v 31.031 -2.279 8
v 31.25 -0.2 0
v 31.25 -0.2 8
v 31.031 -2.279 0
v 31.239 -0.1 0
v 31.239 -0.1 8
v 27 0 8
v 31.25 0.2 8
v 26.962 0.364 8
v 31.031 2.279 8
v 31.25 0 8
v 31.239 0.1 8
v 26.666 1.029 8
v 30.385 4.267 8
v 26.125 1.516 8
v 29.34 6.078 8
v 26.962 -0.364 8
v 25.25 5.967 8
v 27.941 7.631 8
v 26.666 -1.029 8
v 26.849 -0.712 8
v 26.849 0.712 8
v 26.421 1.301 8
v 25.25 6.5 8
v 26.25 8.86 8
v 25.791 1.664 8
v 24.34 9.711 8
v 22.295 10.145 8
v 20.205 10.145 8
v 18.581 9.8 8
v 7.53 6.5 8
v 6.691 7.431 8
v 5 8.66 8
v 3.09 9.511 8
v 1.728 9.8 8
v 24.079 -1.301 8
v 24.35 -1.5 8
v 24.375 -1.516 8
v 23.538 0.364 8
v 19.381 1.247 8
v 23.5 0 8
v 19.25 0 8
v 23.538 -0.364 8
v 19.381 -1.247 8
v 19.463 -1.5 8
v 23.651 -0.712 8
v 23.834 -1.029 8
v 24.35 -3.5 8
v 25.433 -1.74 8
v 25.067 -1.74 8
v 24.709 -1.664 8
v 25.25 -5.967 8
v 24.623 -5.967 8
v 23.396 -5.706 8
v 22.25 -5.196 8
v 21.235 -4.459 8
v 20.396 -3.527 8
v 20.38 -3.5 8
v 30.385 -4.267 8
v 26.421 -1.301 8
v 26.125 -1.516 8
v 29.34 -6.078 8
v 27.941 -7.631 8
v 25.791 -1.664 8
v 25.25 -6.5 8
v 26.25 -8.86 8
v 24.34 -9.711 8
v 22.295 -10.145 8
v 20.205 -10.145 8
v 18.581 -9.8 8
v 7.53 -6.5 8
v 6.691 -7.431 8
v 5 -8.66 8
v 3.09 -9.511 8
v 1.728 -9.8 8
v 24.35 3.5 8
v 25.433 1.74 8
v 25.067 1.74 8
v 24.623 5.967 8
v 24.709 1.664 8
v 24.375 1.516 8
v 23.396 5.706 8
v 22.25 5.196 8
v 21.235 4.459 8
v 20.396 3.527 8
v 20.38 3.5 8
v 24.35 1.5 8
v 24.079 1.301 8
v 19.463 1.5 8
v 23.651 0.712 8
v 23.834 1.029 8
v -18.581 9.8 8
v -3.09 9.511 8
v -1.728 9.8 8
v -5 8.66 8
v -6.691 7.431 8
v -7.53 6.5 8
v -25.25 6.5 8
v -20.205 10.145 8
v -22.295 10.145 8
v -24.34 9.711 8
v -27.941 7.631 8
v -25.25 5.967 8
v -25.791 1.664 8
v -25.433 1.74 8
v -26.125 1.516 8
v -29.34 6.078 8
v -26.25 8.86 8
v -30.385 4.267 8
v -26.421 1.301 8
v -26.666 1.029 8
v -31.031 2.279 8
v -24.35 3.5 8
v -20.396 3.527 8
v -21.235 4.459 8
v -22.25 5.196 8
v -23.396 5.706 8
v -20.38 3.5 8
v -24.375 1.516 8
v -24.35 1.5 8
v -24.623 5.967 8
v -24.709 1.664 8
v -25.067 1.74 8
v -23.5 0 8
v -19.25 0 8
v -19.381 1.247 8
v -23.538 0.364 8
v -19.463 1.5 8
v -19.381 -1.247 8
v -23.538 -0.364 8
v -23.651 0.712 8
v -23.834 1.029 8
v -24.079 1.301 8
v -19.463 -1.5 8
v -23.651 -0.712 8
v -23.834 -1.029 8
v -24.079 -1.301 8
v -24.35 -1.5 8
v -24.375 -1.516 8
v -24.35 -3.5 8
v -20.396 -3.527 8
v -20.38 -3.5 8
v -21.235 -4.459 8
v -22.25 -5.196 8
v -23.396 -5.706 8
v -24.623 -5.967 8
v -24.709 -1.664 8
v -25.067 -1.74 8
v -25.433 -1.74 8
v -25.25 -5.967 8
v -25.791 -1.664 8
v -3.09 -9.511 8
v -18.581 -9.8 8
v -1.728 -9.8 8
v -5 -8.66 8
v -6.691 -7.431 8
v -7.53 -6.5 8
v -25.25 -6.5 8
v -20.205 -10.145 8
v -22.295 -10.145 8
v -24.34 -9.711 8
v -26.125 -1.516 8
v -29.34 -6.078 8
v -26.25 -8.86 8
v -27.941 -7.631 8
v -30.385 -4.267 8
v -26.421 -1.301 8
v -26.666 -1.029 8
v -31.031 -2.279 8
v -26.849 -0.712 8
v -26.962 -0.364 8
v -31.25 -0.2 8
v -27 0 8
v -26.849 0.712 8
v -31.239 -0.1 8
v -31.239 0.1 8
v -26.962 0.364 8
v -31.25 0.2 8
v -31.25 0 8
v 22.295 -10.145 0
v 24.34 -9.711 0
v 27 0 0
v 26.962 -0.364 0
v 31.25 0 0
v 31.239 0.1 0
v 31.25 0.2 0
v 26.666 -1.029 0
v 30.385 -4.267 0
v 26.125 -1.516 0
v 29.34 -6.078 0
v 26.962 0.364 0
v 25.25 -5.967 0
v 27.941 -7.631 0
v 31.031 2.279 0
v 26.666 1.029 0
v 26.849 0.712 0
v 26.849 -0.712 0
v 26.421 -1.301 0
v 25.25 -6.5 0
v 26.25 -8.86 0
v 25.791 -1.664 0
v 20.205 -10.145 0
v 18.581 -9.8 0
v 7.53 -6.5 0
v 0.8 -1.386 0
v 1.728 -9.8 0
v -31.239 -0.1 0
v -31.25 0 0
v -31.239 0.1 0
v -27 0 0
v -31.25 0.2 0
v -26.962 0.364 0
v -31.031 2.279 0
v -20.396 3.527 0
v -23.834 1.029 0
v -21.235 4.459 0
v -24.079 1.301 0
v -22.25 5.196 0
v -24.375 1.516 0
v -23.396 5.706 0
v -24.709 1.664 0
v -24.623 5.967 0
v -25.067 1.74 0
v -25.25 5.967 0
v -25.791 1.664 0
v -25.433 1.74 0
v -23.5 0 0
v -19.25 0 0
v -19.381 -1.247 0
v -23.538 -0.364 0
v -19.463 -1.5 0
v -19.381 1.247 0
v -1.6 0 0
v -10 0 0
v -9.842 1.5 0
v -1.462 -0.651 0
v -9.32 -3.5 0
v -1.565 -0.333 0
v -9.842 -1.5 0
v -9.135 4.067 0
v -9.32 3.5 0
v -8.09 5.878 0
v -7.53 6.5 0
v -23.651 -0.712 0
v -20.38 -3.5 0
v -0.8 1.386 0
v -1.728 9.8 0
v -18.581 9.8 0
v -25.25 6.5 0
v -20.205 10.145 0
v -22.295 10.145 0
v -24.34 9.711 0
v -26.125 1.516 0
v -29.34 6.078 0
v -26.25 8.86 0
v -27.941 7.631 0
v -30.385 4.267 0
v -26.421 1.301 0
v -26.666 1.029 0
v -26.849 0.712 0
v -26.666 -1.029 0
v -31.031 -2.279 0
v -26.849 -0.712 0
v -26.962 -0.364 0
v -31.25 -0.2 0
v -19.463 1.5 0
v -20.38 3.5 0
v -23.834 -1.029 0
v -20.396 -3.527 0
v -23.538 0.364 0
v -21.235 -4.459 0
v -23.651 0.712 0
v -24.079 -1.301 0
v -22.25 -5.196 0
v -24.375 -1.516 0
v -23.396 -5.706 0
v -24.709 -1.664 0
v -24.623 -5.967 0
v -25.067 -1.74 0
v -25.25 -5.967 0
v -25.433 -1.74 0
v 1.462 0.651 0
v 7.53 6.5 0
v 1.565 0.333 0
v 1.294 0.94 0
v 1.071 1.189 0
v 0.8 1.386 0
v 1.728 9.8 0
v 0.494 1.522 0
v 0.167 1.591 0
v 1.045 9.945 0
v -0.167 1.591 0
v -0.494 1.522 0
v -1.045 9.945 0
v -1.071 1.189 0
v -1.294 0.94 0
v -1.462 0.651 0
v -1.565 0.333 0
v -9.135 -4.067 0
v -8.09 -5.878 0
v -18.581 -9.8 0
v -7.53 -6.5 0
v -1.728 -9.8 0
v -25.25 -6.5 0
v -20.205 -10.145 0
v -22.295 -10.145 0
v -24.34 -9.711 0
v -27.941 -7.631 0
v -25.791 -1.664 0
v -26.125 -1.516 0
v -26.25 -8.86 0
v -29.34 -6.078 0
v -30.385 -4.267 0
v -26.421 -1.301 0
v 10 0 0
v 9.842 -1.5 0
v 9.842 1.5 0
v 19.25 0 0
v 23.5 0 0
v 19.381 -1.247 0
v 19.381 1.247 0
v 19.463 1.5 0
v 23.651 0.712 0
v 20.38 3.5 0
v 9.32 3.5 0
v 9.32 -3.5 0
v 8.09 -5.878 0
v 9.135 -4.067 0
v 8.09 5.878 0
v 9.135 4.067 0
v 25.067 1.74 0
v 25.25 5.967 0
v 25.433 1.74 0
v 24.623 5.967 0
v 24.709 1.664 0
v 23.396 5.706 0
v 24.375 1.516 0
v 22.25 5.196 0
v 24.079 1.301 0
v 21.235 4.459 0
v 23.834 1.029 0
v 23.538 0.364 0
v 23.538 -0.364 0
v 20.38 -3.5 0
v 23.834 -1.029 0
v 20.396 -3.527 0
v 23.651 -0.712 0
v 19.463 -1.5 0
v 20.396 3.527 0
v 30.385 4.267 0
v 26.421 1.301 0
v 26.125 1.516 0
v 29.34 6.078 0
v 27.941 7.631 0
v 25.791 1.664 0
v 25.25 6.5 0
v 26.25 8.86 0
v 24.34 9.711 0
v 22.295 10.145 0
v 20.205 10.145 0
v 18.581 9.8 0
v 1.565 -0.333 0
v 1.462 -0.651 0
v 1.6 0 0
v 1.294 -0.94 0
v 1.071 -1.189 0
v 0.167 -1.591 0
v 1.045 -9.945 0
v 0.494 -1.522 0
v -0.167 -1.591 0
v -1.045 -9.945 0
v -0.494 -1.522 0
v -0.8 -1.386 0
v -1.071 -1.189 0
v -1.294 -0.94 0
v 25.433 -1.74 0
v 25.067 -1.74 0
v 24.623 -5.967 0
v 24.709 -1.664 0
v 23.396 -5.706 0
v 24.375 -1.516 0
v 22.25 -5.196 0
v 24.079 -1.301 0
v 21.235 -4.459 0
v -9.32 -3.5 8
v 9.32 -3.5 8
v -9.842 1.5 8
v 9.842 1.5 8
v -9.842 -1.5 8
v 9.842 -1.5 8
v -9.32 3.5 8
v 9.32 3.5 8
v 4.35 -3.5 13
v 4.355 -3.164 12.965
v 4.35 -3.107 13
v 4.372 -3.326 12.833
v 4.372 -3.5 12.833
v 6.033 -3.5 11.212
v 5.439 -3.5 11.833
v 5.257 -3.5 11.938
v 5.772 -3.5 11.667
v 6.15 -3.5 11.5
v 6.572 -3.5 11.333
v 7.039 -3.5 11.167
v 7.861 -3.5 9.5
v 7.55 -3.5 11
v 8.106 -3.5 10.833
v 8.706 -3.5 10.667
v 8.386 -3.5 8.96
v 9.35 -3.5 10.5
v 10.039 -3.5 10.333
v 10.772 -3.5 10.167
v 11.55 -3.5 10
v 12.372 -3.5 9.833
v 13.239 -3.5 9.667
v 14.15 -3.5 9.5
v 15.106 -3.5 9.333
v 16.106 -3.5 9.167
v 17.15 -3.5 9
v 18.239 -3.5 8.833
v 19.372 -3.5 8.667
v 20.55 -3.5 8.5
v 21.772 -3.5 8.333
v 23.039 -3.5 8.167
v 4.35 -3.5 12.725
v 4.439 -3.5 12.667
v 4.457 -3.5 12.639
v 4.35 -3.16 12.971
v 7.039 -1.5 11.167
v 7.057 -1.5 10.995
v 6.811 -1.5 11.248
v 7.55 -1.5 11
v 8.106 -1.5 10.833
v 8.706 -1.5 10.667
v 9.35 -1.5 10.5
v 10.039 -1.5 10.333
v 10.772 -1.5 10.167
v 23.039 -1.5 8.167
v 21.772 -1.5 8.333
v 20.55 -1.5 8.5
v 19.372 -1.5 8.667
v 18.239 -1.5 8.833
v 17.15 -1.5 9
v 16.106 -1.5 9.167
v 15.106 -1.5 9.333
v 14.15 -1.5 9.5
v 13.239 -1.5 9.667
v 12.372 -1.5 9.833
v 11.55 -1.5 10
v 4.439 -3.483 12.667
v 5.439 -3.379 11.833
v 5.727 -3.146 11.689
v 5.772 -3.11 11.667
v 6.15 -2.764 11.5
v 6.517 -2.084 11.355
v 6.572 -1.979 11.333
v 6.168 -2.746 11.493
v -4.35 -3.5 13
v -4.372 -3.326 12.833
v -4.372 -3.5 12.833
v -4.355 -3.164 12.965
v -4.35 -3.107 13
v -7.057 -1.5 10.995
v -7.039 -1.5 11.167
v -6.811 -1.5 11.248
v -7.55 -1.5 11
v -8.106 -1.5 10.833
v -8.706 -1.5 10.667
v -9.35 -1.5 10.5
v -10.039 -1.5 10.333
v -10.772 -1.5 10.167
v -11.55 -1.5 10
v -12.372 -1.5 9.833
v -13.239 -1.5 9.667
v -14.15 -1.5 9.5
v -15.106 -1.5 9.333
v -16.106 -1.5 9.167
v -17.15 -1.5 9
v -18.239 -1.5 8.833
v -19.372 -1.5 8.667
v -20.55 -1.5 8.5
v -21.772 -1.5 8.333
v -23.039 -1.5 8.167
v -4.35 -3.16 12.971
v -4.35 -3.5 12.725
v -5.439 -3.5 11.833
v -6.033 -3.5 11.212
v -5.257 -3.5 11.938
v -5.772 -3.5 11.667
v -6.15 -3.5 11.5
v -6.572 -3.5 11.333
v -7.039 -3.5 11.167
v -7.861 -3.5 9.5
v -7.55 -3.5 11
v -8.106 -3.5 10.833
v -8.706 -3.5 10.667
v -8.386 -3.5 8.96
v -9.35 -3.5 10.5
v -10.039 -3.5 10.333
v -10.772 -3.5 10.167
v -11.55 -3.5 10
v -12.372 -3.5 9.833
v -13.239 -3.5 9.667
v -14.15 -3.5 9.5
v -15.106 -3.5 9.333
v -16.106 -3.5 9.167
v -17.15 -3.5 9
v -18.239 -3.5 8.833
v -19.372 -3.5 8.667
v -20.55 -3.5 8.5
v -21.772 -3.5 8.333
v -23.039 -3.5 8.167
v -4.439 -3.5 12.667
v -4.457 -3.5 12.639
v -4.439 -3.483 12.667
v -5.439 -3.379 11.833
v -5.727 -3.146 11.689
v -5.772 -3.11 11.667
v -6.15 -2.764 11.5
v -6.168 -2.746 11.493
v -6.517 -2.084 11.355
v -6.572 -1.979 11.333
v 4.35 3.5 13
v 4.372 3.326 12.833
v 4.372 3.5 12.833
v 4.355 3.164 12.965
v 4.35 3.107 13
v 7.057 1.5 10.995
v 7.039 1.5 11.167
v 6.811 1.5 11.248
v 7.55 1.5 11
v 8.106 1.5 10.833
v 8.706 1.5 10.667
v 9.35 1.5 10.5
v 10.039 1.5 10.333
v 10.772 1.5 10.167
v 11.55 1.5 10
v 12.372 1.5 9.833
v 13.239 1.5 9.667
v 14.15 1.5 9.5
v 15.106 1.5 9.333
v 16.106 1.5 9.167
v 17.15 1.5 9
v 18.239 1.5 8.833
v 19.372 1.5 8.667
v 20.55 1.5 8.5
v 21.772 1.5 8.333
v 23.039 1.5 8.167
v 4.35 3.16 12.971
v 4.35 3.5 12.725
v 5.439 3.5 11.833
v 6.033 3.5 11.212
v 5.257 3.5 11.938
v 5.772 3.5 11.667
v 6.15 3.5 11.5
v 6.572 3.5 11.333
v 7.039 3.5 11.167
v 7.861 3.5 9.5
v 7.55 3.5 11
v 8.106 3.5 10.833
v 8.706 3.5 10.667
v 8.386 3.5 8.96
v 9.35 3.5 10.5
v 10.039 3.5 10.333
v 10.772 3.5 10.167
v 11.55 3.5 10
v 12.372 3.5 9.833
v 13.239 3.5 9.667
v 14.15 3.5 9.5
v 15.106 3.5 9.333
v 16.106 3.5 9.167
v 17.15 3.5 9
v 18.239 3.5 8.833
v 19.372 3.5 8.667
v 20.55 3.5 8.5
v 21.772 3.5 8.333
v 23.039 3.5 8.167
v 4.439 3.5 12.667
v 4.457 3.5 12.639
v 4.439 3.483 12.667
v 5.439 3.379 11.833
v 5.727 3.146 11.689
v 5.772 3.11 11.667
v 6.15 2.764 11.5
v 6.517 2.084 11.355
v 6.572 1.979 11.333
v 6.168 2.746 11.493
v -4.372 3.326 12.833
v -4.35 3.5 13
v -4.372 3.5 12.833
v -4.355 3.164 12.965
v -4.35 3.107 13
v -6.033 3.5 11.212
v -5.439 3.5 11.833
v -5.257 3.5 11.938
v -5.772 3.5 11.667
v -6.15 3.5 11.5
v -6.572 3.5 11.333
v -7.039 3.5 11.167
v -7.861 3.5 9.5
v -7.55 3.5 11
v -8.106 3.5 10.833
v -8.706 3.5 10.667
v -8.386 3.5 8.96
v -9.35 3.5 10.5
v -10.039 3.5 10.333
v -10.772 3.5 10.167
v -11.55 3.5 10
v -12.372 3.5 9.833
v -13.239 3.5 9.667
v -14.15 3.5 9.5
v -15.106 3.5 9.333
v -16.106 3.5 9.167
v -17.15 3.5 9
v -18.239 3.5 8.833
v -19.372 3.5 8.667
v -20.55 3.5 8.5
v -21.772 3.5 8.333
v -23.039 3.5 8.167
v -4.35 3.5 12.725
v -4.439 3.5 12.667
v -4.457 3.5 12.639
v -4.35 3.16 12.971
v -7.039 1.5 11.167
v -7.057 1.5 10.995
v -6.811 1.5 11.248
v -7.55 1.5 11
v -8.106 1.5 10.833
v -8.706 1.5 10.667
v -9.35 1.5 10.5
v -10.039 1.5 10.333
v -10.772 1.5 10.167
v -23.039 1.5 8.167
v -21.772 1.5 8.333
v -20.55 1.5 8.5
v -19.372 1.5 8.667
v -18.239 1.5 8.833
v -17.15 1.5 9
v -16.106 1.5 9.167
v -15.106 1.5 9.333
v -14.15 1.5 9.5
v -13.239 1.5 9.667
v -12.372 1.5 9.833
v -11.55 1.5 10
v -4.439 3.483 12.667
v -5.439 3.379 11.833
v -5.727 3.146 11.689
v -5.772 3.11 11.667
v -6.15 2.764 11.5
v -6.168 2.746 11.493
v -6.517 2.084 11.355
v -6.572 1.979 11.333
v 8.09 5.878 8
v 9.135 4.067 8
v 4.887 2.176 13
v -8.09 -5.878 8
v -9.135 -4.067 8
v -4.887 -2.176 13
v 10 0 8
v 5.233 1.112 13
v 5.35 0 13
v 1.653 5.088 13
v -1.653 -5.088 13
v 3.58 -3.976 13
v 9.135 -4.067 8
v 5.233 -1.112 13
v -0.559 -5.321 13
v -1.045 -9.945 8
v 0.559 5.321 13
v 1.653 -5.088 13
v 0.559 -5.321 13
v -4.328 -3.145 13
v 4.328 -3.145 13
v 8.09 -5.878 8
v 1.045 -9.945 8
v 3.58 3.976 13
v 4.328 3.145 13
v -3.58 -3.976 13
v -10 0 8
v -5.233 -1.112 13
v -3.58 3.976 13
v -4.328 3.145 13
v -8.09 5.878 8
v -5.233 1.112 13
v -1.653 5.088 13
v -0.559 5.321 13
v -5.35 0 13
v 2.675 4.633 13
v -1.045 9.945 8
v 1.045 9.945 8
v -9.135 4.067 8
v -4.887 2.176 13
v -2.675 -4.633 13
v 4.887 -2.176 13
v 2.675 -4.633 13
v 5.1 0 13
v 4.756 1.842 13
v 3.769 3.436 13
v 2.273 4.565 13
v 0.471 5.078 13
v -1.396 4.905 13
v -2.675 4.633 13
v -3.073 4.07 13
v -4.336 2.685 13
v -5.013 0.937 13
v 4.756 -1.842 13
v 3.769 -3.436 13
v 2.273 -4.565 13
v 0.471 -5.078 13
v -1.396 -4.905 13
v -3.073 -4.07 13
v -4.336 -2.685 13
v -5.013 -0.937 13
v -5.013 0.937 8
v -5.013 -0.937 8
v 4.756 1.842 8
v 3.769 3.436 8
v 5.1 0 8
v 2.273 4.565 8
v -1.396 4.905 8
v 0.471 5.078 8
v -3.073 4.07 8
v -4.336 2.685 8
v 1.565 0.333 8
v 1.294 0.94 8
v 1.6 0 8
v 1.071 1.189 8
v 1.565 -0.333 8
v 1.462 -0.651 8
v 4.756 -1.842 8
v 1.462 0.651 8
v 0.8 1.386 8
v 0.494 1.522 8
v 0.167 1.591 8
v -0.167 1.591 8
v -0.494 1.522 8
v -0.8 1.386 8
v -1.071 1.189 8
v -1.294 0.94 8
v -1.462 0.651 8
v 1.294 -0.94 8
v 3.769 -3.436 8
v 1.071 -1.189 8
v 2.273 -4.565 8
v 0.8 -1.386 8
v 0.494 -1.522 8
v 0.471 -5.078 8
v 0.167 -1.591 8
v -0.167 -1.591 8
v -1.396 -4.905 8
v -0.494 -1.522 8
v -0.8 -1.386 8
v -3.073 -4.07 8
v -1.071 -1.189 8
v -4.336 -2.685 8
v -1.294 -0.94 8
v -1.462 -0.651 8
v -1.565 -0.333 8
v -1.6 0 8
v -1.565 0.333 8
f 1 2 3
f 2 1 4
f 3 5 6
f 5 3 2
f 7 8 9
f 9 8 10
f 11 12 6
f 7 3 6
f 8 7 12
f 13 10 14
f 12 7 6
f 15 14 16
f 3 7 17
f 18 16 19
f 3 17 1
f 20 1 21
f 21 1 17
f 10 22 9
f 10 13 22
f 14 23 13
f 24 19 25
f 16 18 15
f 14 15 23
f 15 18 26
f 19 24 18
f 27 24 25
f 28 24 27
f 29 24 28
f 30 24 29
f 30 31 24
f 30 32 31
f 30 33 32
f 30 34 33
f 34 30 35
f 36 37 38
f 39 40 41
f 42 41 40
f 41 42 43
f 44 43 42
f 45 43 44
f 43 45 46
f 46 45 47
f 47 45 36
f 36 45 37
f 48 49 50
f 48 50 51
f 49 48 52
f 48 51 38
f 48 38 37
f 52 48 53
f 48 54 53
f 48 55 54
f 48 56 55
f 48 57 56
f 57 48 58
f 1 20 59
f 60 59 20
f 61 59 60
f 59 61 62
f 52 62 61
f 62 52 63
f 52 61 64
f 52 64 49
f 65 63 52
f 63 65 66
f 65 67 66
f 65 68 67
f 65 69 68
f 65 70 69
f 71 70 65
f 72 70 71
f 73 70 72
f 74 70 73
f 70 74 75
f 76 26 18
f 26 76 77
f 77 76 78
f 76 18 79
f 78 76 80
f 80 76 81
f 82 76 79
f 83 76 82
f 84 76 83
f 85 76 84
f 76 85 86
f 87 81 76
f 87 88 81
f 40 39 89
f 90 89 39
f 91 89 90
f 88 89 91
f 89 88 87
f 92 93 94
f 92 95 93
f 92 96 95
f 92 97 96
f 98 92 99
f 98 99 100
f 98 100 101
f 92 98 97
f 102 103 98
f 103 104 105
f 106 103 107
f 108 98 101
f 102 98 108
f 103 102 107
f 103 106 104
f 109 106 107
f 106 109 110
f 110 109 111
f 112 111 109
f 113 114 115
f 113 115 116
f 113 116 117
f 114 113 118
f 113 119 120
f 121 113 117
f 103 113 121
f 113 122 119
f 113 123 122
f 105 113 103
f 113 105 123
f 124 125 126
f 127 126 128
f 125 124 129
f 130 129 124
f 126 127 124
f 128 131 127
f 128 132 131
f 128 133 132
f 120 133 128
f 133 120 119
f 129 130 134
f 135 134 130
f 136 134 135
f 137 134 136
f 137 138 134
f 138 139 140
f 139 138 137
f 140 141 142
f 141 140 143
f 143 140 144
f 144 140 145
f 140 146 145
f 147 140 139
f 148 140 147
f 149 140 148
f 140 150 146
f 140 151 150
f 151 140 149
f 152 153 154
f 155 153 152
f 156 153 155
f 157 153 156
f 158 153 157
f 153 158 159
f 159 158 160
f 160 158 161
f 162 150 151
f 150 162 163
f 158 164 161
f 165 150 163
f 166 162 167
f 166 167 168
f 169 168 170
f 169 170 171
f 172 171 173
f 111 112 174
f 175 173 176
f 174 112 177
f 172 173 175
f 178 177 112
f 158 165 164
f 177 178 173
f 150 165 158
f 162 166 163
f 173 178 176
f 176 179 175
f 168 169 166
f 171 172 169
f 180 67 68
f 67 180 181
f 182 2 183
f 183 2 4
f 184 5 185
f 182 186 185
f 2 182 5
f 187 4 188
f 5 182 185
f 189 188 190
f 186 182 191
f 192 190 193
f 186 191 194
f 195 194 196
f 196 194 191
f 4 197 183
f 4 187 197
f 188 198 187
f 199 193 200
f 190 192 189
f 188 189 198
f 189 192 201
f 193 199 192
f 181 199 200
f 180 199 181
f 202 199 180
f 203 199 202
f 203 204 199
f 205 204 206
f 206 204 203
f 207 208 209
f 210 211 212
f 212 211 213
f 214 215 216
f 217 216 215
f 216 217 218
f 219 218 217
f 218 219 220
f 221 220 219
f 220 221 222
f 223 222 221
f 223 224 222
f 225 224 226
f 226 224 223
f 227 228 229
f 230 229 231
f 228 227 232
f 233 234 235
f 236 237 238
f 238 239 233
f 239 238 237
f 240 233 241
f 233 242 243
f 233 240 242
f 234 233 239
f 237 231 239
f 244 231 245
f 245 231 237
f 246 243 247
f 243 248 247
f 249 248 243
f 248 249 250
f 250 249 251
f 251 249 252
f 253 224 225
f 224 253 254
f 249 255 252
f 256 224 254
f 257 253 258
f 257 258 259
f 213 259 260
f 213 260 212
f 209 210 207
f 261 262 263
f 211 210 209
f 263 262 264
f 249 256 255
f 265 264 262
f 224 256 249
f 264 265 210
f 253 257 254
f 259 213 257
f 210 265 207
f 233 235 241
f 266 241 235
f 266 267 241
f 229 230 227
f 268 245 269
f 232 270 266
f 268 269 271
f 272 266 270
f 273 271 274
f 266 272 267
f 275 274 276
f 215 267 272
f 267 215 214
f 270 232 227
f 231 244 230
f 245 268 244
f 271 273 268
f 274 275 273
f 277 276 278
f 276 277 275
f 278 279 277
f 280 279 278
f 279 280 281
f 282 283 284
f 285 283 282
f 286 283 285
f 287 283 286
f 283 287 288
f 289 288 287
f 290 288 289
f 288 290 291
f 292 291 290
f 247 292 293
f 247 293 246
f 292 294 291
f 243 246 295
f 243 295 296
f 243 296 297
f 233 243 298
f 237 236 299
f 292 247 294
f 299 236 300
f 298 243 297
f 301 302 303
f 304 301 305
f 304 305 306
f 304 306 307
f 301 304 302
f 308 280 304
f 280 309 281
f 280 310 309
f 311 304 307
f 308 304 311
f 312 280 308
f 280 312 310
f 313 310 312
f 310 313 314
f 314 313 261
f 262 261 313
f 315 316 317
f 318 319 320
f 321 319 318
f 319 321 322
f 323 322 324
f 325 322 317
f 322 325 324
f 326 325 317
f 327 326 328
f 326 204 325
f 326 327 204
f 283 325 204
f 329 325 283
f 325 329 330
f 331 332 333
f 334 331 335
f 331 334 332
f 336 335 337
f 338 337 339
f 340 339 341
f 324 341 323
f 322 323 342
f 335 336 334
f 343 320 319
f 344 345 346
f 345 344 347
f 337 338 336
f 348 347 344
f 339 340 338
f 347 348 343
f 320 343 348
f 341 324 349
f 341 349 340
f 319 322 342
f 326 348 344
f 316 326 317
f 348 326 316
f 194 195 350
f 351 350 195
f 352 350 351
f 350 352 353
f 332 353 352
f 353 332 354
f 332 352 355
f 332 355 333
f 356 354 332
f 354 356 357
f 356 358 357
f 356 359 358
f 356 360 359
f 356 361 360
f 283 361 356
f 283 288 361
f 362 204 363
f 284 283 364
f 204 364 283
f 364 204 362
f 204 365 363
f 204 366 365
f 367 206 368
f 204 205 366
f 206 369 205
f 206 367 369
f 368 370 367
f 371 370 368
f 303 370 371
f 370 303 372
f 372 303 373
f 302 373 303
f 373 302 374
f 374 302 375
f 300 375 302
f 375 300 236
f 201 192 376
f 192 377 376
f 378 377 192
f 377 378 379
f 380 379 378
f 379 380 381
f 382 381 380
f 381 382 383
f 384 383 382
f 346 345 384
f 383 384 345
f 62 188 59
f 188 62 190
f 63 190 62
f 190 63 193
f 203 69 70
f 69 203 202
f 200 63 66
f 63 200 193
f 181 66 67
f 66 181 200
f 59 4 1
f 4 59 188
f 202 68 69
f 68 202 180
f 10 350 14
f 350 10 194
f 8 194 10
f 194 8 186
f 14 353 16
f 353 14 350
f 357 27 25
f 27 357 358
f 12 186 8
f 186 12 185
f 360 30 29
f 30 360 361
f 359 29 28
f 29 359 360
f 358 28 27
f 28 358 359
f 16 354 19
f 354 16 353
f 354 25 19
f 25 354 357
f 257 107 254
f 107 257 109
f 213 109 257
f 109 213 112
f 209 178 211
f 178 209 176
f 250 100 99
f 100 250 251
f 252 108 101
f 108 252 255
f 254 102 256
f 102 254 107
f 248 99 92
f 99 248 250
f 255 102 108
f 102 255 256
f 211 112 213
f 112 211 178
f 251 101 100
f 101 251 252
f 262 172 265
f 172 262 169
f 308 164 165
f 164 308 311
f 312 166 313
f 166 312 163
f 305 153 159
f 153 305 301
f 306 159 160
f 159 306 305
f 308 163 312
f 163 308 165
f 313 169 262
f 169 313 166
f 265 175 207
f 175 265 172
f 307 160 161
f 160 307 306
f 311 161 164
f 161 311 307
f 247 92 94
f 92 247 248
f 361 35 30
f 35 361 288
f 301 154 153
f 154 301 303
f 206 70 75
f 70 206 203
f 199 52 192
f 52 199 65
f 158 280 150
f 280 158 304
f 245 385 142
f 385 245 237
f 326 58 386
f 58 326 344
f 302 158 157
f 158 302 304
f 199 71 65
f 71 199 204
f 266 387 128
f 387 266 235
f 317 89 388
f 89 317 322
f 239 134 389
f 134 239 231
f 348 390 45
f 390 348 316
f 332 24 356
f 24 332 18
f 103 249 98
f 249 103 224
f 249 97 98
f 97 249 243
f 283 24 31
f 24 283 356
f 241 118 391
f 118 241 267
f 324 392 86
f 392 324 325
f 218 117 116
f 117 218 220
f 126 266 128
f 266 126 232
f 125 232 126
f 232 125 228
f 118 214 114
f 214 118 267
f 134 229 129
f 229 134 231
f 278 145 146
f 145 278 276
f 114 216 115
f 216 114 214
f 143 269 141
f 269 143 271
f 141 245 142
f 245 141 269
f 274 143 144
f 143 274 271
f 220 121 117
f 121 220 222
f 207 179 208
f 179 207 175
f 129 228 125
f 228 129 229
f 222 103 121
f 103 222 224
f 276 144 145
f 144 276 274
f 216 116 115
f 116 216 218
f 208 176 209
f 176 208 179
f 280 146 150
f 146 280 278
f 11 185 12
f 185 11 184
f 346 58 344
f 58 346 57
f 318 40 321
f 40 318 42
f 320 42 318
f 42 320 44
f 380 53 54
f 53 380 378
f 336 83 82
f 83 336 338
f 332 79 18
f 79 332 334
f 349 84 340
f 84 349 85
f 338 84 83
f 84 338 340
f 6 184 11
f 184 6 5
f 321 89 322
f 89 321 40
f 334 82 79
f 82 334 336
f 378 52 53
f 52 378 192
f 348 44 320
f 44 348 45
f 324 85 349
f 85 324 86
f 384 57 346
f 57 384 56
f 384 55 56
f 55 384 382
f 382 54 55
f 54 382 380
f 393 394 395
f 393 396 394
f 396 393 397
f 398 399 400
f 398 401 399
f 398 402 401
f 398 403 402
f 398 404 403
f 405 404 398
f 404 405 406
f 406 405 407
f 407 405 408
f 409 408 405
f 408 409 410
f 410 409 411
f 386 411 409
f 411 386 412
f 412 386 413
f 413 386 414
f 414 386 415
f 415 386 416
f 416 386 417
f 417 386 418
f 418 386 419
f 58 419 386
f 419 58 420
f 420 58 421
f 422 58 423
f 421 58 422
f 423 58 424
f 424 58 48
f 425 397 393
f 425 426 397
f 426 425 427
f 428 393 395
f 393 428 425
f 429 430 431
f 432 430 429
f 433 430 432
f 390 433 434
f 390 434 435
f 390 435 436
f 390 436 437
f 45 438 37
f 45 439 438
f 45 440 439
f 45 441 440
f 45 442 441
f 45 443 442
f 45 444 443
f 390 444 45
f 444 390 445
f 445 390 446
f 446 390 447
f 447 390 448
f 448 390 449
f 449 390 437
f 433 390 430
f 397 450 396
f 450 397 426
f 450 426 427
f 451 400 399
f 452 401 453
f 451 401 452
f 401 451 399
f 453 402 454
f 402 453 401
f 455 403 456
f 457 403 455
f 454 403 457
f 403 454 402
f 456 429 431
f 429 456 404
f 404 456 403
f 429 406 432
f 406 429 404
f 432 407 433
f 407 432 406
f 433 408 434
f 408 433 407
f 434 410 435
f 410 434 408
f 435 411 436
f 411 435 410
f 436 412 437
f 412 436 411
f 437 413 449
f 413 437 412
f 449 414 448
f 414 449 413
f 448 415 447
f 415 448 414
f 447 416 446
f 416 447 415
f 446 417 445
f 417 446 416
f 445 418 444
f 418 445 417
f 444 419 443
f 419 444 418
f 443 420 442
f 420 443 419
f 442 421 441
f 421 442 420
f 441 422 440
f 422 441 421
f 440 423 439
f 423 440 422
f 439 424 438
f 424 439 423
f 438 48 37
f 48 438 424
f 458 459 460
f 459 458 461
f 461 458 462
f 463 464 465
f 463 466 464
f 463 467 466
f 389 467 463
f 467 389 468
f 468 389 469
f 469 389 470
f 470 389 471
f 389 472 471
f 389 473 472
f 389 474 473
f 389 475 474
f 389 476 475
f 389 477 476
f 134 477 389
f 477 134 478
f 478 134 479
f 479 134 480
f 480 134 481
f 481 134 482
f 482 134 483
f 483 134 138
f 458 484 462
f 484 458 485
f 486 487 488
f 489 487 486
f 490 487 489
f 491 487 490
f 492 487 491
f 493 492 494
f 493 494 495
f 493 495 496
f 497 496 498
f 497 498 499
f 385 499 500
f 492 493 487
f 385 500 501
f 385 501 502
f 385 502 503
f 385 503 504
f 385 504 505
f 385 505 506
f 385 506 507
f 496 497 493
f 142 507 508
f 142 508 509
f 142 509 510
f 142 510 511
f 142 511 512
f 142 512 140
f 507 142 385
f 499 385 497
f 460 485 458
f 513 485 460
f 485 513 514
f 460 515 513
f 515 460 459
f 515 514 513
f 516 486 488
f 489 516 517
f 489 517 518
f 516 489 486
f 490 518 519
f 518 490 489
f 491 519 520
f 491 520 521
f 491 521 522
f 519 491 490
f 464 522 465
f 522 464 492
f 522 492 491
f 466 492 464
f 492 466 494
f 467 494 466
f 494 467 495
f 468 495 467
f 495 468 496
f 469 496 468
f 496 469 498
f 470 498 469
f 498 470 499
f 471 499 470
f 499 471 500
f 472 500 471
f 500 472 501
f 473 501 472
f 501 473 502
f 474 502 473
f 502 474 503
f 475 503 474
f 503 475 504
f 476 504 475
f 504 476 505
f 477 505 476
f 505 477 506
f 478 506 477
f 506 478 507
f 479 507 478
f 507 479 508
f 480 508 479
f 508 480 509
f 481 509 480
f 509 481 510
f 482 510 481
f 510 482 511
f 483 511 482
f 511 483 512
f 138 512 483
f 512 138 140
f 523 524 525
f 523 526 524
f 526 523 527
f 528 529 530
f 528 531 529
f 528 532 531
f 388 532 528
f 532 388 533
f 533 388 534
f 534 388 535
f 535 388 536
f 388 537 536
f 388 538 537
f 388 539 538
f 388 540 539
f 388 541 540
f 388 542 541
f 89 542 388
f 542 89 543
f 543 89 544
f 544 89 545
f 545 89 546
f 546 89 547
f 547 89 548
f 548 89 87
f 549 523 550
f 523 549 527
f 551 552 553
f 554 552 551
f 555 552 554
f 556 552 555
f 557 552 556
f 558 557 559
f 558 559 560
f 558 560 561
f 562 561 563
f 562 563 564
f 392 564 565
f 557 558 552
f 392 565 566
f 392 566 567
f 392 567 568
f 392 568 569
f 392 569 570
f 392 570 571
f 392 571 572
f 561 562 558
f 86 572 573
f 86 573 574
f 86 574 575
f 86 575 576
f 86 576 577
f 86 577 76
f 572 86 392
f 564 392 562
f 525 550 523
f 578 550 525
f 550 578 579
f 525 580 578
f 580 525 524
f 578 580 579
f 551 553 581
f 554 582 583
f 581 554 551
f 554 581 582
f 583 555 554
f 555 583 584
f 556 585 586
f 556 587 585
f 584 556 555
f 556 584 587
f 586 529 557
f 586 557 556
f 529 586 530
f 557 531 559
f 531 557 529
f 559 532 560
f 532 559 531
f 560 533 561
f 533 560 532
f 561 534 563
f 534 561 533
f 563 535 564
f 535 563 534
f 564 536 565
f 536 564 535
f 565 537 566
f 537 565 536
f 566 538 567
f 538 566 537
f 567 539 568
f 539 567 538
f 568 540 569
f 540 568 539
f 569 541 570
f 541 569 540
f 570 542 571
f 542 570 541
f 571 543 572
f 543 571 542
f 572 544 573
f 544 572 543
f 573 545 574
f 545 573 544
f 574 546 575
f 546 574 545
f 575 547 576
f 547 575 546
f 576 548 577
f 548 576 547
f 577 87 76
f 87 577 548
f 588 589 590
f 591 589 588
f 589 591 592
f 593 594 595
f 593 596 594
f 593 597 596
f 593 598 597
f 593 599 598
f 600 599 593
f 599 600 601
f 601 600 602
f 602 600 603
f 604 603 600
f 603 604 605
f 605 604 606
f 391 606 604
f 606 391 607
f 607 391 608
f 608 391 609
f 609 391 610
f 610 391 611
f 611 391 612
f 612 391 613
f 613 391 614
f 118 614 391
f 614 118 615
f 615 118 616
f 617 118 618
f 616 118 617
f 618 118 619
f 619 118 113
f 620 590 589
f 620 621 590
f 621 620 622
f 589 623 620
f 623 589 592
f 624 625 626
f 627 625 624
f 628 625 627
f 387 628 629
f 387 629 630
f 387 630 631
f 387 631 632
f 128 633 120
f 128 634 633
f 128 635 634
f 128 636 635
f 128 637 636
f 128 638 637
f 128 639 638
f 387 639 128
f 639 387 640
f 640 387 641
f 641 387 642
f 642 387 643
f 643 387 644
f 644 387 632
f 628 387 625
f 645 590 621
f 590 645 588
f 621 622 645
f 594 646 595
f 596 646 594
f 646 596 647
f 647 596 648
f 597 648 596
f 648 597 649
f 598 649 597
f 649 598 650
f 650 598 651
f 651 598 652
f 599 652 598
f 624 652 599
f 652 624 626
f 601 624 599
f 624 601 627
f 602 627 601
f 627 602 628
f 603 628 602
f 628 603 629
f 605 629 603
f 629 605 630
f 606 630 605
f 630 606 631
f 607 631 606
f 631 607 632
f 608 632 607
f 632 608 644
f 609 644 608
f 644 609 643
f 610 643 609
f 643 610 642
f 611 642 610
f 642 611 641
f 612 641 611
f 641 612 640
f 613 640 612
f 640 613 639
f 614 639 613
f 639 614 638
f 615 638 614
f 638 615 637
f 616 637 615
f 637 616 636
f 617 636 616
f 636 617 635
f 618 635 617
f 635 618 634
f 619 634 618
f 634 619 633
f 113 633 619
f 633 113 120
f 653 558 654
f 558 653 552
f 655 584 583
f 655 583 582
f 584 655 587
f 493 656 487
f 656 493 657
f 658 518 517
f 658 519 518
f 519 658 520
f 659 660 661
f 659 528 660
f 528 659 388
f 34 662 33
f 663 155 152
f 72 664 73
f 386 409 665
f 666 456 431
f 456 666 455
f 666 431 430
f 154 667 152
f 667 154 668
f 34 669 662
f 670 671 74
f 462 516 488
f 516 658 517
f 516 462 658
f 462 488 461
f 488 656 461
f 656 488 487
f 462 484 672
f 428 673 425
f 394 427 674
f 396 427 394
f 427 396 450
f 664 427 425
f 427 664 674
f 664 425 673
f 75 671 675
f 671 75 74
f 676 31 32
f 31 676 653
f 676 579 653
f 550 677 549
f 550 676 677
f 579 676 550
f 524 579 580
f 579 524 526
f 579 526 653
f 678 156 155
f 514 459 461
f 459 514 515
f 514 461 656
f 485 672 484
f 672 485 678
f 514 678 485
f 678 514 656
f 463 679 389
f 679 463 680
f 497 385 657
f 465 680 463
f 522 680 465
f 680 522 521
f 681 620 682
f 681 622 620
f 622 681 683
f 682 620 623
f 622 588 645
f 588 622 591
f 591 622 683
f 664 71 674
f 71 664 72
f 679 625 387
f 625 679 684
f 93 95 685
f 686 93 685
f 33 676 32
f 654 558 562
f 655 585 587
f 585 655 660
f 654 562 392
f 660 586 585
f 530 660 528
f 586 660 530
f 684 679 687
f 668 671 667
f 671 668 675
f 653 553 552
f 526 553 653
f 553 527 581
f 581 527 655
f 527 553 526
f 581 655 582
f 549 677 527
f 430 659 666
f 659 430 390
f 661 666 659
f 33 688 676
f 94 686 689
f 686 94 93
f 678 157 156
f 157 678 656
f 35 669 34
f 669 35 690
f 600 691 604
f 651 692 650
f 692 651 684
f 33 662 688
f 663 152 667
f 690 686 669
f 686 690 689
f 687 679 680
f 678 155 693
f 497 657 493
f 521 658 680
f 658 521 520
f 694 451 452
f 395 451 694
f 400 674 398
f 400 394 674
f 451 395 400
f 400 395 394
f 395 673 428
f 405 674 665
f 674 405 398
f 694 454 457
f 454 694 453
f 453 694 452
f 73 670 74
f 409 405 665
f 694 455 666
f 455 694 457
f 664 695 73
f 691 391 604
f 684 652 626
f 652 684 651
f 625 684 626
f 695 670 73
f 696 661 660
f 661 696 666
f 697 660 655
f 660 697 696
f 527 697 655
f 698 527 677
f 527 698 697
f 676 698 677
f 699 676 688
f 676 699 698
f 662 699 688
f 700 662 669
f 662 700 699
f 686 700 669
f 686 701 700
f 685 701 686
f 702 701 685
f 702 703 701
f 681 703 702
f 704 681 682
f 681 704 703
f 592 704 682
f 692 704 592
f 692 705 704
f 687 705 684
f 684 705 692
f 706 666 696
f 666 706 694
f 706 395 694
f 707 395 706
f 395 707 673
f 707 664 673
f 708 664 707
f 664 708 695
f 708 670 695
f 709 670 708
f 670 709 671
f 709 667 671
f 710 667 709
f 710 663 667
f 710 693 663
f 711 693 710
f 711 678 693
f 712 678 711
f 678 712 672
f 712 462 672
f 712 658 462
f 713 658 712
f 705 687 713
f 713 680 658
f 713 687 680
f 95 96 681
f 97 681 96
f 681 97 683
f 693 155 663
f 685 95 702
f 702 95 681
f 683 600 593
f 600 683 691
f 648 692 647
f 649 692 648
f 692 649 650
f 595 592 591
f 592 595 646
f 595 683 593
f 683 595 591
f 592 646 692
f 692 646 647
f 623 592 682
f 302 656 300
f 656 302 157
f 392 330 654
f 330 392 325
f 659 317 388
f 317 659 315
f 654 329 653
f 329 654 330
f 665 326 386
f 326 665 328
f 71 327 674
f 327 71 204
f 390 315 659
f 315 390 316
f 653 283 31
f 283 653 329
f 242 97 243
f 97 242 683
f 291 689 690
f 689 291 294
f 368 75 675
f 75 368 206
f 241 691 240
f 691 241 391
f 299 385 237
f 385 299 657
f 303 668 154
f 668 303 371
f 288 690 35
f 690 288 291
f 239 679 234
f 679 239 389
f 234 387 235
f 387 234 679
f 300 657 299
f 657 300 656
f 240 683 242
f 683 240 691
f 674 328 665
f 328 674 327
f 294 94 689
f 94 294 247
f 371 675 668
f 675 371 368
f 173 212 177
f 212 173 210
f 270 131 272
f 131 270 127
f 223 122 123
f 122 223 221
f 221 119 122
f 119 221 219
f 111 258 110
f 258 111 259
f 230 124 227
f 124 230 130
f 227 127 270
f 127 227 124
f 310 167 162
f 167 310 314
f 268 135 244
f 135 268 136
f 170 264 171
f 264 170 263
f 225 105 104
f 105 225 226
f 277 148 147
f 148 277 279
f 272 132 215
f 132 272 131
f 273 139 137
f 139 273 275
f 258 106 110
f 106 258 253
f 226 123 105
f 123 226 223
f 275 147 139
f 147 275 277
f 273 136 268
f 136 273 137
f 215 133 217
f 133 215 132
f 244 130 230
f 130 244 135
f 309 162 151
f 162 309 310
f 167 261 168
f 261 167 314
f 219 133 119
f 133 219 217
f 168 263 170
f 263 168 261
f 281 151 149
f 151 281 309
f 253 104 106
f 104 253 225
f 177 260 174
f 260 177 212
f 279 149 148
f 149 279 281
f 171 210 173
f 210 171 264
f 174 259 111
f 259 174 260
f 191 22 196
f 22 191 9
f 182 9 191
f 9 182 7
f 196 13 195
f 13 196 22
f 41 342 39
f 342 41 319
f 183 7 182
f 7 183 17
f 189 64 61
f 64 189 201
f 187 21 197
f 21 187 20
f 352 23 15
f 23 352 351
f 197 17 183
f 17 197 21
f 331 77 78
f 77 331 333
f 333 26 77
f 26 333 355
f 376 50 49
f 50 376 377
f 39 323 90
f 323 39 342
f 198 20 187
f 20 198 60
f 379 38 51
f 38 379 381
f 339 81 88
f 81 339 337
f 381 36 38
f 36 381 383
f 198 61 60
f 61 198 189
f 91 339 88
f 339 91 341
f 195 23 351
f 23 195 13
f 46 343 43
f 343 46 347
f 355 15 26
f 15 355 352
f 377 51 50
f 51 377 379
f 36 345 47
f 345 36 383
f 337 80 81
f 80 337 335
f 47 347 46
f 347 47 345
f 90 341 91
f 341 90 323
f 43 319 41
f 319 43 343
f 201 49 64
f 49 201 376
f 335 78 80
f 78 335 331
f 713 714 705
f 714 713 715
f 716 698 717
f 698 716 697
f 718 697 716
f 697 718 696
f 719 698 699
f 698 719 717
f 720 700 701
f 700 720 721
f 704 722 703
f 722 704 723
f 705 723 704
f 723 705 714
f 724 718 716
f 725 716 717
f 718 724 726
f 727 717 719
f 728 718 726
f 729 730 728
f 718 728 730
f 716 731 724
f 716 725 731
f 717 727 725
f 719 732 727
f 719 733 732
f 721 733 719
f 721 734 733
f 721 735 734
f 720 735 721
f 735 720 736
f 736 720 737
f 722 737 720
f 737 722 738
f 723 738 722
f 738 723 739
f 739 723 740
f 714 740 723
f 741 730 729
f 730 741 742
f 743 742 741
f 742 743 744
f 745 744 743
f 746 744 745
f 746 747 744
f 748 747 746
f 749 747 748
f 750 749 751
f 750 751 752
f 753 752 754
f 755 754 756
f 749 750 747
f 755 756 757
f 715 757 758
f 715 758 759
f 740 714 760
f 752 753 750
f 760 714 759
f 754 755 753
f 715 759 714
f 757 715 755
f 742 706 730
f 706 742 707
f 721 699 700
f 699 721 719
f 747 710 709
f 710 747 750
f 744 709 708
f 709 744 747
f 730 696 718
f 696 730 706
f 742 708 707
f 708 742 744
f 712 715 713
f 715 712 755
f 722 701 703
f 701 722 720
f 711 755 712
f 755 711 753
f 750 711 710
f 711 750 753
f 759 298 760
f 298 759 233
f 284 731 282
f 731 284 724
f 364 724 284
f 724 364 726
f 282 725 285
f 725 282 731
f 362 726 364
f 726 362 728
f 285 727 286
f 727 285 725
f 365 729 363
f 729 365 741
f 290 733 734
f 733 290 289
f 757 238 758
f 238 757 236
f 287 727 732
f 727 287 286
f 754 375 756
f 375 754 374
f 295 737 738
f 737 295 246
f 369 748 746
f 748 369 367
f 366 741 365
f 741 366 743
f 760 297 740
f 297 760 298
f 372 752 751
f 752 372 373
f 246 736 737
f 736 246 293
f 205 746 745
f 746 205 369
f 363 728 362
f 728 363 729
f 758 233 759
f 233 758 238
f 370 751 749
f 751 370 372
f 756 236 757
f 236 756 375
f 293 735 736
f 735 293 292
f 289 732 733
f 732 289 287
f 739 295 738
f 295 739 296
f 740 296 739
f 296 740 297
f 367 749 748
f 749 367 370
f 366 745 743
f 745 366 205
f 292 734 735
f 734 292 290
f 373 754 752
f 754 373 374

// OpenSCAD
include <Primitivas.scad>
include <DPNcarriage.scad>

round_qual=30;

module assembled(){
	LM8UUs();
	nozzles();
	carriage();
	color([1,1,1]);
	rails(0);
	
	for(i=[-1,1]){
		translate([i*sep_nozzles/2,0,car_height+4]){
			rotate([0,0,90]){
				feeder();
			}
		}	
	}
	for(i=[-1,1]){
		translate([i*(holder_center_wall+nut_gap)/2,(car_width+holder_plat)/2,car_height-holder_height]){
			rotate([0,180,90]){
				retainer(rosca,holder_bolt_sep,ret_width,ret_height,ch_extra);
			}
		}
	}
	for(i=[-1,1]){
		translate([i*(car_lenght-fan_depth)/2,0,car_height-(fan_side/2)-3]){
			//cube([fan_depth,fan_side,fan_side],center=true);
		}
	}
	for(i=[-1,1]){
		translate([i*sep_nozzles/2,0,car_height-27.6+(16.35/2)]){
			cylinder(r1=8,r2=8,h=16.35,$fn=round_qual,center=true);
		}
	}
	translate([0,0,car_height-((fan_side-8)/2)-3]){
		canalizer(car_lenght-(2*fan_depth)-(2*walls)-1,fan_side-1,fan_side-8,40,20,28,3,fan_bolt_spacing,3);
	}
}



//assembled();

//vent2(fan_depth,fan_side,fan_bolt_spacing,car_lenght,rosca,20,switchable_fan);

//canalizer(car_lenght-(2*fan_depth)-(2*walls)-1,fan_side-1,fan_side-8,40,20,28,3,fan_bolt_spacing,3);



//carriage();

//retainer(rosca,holder_bolt_sep,ret_width,ret_height,ch_extra);

feeder(0.5);
